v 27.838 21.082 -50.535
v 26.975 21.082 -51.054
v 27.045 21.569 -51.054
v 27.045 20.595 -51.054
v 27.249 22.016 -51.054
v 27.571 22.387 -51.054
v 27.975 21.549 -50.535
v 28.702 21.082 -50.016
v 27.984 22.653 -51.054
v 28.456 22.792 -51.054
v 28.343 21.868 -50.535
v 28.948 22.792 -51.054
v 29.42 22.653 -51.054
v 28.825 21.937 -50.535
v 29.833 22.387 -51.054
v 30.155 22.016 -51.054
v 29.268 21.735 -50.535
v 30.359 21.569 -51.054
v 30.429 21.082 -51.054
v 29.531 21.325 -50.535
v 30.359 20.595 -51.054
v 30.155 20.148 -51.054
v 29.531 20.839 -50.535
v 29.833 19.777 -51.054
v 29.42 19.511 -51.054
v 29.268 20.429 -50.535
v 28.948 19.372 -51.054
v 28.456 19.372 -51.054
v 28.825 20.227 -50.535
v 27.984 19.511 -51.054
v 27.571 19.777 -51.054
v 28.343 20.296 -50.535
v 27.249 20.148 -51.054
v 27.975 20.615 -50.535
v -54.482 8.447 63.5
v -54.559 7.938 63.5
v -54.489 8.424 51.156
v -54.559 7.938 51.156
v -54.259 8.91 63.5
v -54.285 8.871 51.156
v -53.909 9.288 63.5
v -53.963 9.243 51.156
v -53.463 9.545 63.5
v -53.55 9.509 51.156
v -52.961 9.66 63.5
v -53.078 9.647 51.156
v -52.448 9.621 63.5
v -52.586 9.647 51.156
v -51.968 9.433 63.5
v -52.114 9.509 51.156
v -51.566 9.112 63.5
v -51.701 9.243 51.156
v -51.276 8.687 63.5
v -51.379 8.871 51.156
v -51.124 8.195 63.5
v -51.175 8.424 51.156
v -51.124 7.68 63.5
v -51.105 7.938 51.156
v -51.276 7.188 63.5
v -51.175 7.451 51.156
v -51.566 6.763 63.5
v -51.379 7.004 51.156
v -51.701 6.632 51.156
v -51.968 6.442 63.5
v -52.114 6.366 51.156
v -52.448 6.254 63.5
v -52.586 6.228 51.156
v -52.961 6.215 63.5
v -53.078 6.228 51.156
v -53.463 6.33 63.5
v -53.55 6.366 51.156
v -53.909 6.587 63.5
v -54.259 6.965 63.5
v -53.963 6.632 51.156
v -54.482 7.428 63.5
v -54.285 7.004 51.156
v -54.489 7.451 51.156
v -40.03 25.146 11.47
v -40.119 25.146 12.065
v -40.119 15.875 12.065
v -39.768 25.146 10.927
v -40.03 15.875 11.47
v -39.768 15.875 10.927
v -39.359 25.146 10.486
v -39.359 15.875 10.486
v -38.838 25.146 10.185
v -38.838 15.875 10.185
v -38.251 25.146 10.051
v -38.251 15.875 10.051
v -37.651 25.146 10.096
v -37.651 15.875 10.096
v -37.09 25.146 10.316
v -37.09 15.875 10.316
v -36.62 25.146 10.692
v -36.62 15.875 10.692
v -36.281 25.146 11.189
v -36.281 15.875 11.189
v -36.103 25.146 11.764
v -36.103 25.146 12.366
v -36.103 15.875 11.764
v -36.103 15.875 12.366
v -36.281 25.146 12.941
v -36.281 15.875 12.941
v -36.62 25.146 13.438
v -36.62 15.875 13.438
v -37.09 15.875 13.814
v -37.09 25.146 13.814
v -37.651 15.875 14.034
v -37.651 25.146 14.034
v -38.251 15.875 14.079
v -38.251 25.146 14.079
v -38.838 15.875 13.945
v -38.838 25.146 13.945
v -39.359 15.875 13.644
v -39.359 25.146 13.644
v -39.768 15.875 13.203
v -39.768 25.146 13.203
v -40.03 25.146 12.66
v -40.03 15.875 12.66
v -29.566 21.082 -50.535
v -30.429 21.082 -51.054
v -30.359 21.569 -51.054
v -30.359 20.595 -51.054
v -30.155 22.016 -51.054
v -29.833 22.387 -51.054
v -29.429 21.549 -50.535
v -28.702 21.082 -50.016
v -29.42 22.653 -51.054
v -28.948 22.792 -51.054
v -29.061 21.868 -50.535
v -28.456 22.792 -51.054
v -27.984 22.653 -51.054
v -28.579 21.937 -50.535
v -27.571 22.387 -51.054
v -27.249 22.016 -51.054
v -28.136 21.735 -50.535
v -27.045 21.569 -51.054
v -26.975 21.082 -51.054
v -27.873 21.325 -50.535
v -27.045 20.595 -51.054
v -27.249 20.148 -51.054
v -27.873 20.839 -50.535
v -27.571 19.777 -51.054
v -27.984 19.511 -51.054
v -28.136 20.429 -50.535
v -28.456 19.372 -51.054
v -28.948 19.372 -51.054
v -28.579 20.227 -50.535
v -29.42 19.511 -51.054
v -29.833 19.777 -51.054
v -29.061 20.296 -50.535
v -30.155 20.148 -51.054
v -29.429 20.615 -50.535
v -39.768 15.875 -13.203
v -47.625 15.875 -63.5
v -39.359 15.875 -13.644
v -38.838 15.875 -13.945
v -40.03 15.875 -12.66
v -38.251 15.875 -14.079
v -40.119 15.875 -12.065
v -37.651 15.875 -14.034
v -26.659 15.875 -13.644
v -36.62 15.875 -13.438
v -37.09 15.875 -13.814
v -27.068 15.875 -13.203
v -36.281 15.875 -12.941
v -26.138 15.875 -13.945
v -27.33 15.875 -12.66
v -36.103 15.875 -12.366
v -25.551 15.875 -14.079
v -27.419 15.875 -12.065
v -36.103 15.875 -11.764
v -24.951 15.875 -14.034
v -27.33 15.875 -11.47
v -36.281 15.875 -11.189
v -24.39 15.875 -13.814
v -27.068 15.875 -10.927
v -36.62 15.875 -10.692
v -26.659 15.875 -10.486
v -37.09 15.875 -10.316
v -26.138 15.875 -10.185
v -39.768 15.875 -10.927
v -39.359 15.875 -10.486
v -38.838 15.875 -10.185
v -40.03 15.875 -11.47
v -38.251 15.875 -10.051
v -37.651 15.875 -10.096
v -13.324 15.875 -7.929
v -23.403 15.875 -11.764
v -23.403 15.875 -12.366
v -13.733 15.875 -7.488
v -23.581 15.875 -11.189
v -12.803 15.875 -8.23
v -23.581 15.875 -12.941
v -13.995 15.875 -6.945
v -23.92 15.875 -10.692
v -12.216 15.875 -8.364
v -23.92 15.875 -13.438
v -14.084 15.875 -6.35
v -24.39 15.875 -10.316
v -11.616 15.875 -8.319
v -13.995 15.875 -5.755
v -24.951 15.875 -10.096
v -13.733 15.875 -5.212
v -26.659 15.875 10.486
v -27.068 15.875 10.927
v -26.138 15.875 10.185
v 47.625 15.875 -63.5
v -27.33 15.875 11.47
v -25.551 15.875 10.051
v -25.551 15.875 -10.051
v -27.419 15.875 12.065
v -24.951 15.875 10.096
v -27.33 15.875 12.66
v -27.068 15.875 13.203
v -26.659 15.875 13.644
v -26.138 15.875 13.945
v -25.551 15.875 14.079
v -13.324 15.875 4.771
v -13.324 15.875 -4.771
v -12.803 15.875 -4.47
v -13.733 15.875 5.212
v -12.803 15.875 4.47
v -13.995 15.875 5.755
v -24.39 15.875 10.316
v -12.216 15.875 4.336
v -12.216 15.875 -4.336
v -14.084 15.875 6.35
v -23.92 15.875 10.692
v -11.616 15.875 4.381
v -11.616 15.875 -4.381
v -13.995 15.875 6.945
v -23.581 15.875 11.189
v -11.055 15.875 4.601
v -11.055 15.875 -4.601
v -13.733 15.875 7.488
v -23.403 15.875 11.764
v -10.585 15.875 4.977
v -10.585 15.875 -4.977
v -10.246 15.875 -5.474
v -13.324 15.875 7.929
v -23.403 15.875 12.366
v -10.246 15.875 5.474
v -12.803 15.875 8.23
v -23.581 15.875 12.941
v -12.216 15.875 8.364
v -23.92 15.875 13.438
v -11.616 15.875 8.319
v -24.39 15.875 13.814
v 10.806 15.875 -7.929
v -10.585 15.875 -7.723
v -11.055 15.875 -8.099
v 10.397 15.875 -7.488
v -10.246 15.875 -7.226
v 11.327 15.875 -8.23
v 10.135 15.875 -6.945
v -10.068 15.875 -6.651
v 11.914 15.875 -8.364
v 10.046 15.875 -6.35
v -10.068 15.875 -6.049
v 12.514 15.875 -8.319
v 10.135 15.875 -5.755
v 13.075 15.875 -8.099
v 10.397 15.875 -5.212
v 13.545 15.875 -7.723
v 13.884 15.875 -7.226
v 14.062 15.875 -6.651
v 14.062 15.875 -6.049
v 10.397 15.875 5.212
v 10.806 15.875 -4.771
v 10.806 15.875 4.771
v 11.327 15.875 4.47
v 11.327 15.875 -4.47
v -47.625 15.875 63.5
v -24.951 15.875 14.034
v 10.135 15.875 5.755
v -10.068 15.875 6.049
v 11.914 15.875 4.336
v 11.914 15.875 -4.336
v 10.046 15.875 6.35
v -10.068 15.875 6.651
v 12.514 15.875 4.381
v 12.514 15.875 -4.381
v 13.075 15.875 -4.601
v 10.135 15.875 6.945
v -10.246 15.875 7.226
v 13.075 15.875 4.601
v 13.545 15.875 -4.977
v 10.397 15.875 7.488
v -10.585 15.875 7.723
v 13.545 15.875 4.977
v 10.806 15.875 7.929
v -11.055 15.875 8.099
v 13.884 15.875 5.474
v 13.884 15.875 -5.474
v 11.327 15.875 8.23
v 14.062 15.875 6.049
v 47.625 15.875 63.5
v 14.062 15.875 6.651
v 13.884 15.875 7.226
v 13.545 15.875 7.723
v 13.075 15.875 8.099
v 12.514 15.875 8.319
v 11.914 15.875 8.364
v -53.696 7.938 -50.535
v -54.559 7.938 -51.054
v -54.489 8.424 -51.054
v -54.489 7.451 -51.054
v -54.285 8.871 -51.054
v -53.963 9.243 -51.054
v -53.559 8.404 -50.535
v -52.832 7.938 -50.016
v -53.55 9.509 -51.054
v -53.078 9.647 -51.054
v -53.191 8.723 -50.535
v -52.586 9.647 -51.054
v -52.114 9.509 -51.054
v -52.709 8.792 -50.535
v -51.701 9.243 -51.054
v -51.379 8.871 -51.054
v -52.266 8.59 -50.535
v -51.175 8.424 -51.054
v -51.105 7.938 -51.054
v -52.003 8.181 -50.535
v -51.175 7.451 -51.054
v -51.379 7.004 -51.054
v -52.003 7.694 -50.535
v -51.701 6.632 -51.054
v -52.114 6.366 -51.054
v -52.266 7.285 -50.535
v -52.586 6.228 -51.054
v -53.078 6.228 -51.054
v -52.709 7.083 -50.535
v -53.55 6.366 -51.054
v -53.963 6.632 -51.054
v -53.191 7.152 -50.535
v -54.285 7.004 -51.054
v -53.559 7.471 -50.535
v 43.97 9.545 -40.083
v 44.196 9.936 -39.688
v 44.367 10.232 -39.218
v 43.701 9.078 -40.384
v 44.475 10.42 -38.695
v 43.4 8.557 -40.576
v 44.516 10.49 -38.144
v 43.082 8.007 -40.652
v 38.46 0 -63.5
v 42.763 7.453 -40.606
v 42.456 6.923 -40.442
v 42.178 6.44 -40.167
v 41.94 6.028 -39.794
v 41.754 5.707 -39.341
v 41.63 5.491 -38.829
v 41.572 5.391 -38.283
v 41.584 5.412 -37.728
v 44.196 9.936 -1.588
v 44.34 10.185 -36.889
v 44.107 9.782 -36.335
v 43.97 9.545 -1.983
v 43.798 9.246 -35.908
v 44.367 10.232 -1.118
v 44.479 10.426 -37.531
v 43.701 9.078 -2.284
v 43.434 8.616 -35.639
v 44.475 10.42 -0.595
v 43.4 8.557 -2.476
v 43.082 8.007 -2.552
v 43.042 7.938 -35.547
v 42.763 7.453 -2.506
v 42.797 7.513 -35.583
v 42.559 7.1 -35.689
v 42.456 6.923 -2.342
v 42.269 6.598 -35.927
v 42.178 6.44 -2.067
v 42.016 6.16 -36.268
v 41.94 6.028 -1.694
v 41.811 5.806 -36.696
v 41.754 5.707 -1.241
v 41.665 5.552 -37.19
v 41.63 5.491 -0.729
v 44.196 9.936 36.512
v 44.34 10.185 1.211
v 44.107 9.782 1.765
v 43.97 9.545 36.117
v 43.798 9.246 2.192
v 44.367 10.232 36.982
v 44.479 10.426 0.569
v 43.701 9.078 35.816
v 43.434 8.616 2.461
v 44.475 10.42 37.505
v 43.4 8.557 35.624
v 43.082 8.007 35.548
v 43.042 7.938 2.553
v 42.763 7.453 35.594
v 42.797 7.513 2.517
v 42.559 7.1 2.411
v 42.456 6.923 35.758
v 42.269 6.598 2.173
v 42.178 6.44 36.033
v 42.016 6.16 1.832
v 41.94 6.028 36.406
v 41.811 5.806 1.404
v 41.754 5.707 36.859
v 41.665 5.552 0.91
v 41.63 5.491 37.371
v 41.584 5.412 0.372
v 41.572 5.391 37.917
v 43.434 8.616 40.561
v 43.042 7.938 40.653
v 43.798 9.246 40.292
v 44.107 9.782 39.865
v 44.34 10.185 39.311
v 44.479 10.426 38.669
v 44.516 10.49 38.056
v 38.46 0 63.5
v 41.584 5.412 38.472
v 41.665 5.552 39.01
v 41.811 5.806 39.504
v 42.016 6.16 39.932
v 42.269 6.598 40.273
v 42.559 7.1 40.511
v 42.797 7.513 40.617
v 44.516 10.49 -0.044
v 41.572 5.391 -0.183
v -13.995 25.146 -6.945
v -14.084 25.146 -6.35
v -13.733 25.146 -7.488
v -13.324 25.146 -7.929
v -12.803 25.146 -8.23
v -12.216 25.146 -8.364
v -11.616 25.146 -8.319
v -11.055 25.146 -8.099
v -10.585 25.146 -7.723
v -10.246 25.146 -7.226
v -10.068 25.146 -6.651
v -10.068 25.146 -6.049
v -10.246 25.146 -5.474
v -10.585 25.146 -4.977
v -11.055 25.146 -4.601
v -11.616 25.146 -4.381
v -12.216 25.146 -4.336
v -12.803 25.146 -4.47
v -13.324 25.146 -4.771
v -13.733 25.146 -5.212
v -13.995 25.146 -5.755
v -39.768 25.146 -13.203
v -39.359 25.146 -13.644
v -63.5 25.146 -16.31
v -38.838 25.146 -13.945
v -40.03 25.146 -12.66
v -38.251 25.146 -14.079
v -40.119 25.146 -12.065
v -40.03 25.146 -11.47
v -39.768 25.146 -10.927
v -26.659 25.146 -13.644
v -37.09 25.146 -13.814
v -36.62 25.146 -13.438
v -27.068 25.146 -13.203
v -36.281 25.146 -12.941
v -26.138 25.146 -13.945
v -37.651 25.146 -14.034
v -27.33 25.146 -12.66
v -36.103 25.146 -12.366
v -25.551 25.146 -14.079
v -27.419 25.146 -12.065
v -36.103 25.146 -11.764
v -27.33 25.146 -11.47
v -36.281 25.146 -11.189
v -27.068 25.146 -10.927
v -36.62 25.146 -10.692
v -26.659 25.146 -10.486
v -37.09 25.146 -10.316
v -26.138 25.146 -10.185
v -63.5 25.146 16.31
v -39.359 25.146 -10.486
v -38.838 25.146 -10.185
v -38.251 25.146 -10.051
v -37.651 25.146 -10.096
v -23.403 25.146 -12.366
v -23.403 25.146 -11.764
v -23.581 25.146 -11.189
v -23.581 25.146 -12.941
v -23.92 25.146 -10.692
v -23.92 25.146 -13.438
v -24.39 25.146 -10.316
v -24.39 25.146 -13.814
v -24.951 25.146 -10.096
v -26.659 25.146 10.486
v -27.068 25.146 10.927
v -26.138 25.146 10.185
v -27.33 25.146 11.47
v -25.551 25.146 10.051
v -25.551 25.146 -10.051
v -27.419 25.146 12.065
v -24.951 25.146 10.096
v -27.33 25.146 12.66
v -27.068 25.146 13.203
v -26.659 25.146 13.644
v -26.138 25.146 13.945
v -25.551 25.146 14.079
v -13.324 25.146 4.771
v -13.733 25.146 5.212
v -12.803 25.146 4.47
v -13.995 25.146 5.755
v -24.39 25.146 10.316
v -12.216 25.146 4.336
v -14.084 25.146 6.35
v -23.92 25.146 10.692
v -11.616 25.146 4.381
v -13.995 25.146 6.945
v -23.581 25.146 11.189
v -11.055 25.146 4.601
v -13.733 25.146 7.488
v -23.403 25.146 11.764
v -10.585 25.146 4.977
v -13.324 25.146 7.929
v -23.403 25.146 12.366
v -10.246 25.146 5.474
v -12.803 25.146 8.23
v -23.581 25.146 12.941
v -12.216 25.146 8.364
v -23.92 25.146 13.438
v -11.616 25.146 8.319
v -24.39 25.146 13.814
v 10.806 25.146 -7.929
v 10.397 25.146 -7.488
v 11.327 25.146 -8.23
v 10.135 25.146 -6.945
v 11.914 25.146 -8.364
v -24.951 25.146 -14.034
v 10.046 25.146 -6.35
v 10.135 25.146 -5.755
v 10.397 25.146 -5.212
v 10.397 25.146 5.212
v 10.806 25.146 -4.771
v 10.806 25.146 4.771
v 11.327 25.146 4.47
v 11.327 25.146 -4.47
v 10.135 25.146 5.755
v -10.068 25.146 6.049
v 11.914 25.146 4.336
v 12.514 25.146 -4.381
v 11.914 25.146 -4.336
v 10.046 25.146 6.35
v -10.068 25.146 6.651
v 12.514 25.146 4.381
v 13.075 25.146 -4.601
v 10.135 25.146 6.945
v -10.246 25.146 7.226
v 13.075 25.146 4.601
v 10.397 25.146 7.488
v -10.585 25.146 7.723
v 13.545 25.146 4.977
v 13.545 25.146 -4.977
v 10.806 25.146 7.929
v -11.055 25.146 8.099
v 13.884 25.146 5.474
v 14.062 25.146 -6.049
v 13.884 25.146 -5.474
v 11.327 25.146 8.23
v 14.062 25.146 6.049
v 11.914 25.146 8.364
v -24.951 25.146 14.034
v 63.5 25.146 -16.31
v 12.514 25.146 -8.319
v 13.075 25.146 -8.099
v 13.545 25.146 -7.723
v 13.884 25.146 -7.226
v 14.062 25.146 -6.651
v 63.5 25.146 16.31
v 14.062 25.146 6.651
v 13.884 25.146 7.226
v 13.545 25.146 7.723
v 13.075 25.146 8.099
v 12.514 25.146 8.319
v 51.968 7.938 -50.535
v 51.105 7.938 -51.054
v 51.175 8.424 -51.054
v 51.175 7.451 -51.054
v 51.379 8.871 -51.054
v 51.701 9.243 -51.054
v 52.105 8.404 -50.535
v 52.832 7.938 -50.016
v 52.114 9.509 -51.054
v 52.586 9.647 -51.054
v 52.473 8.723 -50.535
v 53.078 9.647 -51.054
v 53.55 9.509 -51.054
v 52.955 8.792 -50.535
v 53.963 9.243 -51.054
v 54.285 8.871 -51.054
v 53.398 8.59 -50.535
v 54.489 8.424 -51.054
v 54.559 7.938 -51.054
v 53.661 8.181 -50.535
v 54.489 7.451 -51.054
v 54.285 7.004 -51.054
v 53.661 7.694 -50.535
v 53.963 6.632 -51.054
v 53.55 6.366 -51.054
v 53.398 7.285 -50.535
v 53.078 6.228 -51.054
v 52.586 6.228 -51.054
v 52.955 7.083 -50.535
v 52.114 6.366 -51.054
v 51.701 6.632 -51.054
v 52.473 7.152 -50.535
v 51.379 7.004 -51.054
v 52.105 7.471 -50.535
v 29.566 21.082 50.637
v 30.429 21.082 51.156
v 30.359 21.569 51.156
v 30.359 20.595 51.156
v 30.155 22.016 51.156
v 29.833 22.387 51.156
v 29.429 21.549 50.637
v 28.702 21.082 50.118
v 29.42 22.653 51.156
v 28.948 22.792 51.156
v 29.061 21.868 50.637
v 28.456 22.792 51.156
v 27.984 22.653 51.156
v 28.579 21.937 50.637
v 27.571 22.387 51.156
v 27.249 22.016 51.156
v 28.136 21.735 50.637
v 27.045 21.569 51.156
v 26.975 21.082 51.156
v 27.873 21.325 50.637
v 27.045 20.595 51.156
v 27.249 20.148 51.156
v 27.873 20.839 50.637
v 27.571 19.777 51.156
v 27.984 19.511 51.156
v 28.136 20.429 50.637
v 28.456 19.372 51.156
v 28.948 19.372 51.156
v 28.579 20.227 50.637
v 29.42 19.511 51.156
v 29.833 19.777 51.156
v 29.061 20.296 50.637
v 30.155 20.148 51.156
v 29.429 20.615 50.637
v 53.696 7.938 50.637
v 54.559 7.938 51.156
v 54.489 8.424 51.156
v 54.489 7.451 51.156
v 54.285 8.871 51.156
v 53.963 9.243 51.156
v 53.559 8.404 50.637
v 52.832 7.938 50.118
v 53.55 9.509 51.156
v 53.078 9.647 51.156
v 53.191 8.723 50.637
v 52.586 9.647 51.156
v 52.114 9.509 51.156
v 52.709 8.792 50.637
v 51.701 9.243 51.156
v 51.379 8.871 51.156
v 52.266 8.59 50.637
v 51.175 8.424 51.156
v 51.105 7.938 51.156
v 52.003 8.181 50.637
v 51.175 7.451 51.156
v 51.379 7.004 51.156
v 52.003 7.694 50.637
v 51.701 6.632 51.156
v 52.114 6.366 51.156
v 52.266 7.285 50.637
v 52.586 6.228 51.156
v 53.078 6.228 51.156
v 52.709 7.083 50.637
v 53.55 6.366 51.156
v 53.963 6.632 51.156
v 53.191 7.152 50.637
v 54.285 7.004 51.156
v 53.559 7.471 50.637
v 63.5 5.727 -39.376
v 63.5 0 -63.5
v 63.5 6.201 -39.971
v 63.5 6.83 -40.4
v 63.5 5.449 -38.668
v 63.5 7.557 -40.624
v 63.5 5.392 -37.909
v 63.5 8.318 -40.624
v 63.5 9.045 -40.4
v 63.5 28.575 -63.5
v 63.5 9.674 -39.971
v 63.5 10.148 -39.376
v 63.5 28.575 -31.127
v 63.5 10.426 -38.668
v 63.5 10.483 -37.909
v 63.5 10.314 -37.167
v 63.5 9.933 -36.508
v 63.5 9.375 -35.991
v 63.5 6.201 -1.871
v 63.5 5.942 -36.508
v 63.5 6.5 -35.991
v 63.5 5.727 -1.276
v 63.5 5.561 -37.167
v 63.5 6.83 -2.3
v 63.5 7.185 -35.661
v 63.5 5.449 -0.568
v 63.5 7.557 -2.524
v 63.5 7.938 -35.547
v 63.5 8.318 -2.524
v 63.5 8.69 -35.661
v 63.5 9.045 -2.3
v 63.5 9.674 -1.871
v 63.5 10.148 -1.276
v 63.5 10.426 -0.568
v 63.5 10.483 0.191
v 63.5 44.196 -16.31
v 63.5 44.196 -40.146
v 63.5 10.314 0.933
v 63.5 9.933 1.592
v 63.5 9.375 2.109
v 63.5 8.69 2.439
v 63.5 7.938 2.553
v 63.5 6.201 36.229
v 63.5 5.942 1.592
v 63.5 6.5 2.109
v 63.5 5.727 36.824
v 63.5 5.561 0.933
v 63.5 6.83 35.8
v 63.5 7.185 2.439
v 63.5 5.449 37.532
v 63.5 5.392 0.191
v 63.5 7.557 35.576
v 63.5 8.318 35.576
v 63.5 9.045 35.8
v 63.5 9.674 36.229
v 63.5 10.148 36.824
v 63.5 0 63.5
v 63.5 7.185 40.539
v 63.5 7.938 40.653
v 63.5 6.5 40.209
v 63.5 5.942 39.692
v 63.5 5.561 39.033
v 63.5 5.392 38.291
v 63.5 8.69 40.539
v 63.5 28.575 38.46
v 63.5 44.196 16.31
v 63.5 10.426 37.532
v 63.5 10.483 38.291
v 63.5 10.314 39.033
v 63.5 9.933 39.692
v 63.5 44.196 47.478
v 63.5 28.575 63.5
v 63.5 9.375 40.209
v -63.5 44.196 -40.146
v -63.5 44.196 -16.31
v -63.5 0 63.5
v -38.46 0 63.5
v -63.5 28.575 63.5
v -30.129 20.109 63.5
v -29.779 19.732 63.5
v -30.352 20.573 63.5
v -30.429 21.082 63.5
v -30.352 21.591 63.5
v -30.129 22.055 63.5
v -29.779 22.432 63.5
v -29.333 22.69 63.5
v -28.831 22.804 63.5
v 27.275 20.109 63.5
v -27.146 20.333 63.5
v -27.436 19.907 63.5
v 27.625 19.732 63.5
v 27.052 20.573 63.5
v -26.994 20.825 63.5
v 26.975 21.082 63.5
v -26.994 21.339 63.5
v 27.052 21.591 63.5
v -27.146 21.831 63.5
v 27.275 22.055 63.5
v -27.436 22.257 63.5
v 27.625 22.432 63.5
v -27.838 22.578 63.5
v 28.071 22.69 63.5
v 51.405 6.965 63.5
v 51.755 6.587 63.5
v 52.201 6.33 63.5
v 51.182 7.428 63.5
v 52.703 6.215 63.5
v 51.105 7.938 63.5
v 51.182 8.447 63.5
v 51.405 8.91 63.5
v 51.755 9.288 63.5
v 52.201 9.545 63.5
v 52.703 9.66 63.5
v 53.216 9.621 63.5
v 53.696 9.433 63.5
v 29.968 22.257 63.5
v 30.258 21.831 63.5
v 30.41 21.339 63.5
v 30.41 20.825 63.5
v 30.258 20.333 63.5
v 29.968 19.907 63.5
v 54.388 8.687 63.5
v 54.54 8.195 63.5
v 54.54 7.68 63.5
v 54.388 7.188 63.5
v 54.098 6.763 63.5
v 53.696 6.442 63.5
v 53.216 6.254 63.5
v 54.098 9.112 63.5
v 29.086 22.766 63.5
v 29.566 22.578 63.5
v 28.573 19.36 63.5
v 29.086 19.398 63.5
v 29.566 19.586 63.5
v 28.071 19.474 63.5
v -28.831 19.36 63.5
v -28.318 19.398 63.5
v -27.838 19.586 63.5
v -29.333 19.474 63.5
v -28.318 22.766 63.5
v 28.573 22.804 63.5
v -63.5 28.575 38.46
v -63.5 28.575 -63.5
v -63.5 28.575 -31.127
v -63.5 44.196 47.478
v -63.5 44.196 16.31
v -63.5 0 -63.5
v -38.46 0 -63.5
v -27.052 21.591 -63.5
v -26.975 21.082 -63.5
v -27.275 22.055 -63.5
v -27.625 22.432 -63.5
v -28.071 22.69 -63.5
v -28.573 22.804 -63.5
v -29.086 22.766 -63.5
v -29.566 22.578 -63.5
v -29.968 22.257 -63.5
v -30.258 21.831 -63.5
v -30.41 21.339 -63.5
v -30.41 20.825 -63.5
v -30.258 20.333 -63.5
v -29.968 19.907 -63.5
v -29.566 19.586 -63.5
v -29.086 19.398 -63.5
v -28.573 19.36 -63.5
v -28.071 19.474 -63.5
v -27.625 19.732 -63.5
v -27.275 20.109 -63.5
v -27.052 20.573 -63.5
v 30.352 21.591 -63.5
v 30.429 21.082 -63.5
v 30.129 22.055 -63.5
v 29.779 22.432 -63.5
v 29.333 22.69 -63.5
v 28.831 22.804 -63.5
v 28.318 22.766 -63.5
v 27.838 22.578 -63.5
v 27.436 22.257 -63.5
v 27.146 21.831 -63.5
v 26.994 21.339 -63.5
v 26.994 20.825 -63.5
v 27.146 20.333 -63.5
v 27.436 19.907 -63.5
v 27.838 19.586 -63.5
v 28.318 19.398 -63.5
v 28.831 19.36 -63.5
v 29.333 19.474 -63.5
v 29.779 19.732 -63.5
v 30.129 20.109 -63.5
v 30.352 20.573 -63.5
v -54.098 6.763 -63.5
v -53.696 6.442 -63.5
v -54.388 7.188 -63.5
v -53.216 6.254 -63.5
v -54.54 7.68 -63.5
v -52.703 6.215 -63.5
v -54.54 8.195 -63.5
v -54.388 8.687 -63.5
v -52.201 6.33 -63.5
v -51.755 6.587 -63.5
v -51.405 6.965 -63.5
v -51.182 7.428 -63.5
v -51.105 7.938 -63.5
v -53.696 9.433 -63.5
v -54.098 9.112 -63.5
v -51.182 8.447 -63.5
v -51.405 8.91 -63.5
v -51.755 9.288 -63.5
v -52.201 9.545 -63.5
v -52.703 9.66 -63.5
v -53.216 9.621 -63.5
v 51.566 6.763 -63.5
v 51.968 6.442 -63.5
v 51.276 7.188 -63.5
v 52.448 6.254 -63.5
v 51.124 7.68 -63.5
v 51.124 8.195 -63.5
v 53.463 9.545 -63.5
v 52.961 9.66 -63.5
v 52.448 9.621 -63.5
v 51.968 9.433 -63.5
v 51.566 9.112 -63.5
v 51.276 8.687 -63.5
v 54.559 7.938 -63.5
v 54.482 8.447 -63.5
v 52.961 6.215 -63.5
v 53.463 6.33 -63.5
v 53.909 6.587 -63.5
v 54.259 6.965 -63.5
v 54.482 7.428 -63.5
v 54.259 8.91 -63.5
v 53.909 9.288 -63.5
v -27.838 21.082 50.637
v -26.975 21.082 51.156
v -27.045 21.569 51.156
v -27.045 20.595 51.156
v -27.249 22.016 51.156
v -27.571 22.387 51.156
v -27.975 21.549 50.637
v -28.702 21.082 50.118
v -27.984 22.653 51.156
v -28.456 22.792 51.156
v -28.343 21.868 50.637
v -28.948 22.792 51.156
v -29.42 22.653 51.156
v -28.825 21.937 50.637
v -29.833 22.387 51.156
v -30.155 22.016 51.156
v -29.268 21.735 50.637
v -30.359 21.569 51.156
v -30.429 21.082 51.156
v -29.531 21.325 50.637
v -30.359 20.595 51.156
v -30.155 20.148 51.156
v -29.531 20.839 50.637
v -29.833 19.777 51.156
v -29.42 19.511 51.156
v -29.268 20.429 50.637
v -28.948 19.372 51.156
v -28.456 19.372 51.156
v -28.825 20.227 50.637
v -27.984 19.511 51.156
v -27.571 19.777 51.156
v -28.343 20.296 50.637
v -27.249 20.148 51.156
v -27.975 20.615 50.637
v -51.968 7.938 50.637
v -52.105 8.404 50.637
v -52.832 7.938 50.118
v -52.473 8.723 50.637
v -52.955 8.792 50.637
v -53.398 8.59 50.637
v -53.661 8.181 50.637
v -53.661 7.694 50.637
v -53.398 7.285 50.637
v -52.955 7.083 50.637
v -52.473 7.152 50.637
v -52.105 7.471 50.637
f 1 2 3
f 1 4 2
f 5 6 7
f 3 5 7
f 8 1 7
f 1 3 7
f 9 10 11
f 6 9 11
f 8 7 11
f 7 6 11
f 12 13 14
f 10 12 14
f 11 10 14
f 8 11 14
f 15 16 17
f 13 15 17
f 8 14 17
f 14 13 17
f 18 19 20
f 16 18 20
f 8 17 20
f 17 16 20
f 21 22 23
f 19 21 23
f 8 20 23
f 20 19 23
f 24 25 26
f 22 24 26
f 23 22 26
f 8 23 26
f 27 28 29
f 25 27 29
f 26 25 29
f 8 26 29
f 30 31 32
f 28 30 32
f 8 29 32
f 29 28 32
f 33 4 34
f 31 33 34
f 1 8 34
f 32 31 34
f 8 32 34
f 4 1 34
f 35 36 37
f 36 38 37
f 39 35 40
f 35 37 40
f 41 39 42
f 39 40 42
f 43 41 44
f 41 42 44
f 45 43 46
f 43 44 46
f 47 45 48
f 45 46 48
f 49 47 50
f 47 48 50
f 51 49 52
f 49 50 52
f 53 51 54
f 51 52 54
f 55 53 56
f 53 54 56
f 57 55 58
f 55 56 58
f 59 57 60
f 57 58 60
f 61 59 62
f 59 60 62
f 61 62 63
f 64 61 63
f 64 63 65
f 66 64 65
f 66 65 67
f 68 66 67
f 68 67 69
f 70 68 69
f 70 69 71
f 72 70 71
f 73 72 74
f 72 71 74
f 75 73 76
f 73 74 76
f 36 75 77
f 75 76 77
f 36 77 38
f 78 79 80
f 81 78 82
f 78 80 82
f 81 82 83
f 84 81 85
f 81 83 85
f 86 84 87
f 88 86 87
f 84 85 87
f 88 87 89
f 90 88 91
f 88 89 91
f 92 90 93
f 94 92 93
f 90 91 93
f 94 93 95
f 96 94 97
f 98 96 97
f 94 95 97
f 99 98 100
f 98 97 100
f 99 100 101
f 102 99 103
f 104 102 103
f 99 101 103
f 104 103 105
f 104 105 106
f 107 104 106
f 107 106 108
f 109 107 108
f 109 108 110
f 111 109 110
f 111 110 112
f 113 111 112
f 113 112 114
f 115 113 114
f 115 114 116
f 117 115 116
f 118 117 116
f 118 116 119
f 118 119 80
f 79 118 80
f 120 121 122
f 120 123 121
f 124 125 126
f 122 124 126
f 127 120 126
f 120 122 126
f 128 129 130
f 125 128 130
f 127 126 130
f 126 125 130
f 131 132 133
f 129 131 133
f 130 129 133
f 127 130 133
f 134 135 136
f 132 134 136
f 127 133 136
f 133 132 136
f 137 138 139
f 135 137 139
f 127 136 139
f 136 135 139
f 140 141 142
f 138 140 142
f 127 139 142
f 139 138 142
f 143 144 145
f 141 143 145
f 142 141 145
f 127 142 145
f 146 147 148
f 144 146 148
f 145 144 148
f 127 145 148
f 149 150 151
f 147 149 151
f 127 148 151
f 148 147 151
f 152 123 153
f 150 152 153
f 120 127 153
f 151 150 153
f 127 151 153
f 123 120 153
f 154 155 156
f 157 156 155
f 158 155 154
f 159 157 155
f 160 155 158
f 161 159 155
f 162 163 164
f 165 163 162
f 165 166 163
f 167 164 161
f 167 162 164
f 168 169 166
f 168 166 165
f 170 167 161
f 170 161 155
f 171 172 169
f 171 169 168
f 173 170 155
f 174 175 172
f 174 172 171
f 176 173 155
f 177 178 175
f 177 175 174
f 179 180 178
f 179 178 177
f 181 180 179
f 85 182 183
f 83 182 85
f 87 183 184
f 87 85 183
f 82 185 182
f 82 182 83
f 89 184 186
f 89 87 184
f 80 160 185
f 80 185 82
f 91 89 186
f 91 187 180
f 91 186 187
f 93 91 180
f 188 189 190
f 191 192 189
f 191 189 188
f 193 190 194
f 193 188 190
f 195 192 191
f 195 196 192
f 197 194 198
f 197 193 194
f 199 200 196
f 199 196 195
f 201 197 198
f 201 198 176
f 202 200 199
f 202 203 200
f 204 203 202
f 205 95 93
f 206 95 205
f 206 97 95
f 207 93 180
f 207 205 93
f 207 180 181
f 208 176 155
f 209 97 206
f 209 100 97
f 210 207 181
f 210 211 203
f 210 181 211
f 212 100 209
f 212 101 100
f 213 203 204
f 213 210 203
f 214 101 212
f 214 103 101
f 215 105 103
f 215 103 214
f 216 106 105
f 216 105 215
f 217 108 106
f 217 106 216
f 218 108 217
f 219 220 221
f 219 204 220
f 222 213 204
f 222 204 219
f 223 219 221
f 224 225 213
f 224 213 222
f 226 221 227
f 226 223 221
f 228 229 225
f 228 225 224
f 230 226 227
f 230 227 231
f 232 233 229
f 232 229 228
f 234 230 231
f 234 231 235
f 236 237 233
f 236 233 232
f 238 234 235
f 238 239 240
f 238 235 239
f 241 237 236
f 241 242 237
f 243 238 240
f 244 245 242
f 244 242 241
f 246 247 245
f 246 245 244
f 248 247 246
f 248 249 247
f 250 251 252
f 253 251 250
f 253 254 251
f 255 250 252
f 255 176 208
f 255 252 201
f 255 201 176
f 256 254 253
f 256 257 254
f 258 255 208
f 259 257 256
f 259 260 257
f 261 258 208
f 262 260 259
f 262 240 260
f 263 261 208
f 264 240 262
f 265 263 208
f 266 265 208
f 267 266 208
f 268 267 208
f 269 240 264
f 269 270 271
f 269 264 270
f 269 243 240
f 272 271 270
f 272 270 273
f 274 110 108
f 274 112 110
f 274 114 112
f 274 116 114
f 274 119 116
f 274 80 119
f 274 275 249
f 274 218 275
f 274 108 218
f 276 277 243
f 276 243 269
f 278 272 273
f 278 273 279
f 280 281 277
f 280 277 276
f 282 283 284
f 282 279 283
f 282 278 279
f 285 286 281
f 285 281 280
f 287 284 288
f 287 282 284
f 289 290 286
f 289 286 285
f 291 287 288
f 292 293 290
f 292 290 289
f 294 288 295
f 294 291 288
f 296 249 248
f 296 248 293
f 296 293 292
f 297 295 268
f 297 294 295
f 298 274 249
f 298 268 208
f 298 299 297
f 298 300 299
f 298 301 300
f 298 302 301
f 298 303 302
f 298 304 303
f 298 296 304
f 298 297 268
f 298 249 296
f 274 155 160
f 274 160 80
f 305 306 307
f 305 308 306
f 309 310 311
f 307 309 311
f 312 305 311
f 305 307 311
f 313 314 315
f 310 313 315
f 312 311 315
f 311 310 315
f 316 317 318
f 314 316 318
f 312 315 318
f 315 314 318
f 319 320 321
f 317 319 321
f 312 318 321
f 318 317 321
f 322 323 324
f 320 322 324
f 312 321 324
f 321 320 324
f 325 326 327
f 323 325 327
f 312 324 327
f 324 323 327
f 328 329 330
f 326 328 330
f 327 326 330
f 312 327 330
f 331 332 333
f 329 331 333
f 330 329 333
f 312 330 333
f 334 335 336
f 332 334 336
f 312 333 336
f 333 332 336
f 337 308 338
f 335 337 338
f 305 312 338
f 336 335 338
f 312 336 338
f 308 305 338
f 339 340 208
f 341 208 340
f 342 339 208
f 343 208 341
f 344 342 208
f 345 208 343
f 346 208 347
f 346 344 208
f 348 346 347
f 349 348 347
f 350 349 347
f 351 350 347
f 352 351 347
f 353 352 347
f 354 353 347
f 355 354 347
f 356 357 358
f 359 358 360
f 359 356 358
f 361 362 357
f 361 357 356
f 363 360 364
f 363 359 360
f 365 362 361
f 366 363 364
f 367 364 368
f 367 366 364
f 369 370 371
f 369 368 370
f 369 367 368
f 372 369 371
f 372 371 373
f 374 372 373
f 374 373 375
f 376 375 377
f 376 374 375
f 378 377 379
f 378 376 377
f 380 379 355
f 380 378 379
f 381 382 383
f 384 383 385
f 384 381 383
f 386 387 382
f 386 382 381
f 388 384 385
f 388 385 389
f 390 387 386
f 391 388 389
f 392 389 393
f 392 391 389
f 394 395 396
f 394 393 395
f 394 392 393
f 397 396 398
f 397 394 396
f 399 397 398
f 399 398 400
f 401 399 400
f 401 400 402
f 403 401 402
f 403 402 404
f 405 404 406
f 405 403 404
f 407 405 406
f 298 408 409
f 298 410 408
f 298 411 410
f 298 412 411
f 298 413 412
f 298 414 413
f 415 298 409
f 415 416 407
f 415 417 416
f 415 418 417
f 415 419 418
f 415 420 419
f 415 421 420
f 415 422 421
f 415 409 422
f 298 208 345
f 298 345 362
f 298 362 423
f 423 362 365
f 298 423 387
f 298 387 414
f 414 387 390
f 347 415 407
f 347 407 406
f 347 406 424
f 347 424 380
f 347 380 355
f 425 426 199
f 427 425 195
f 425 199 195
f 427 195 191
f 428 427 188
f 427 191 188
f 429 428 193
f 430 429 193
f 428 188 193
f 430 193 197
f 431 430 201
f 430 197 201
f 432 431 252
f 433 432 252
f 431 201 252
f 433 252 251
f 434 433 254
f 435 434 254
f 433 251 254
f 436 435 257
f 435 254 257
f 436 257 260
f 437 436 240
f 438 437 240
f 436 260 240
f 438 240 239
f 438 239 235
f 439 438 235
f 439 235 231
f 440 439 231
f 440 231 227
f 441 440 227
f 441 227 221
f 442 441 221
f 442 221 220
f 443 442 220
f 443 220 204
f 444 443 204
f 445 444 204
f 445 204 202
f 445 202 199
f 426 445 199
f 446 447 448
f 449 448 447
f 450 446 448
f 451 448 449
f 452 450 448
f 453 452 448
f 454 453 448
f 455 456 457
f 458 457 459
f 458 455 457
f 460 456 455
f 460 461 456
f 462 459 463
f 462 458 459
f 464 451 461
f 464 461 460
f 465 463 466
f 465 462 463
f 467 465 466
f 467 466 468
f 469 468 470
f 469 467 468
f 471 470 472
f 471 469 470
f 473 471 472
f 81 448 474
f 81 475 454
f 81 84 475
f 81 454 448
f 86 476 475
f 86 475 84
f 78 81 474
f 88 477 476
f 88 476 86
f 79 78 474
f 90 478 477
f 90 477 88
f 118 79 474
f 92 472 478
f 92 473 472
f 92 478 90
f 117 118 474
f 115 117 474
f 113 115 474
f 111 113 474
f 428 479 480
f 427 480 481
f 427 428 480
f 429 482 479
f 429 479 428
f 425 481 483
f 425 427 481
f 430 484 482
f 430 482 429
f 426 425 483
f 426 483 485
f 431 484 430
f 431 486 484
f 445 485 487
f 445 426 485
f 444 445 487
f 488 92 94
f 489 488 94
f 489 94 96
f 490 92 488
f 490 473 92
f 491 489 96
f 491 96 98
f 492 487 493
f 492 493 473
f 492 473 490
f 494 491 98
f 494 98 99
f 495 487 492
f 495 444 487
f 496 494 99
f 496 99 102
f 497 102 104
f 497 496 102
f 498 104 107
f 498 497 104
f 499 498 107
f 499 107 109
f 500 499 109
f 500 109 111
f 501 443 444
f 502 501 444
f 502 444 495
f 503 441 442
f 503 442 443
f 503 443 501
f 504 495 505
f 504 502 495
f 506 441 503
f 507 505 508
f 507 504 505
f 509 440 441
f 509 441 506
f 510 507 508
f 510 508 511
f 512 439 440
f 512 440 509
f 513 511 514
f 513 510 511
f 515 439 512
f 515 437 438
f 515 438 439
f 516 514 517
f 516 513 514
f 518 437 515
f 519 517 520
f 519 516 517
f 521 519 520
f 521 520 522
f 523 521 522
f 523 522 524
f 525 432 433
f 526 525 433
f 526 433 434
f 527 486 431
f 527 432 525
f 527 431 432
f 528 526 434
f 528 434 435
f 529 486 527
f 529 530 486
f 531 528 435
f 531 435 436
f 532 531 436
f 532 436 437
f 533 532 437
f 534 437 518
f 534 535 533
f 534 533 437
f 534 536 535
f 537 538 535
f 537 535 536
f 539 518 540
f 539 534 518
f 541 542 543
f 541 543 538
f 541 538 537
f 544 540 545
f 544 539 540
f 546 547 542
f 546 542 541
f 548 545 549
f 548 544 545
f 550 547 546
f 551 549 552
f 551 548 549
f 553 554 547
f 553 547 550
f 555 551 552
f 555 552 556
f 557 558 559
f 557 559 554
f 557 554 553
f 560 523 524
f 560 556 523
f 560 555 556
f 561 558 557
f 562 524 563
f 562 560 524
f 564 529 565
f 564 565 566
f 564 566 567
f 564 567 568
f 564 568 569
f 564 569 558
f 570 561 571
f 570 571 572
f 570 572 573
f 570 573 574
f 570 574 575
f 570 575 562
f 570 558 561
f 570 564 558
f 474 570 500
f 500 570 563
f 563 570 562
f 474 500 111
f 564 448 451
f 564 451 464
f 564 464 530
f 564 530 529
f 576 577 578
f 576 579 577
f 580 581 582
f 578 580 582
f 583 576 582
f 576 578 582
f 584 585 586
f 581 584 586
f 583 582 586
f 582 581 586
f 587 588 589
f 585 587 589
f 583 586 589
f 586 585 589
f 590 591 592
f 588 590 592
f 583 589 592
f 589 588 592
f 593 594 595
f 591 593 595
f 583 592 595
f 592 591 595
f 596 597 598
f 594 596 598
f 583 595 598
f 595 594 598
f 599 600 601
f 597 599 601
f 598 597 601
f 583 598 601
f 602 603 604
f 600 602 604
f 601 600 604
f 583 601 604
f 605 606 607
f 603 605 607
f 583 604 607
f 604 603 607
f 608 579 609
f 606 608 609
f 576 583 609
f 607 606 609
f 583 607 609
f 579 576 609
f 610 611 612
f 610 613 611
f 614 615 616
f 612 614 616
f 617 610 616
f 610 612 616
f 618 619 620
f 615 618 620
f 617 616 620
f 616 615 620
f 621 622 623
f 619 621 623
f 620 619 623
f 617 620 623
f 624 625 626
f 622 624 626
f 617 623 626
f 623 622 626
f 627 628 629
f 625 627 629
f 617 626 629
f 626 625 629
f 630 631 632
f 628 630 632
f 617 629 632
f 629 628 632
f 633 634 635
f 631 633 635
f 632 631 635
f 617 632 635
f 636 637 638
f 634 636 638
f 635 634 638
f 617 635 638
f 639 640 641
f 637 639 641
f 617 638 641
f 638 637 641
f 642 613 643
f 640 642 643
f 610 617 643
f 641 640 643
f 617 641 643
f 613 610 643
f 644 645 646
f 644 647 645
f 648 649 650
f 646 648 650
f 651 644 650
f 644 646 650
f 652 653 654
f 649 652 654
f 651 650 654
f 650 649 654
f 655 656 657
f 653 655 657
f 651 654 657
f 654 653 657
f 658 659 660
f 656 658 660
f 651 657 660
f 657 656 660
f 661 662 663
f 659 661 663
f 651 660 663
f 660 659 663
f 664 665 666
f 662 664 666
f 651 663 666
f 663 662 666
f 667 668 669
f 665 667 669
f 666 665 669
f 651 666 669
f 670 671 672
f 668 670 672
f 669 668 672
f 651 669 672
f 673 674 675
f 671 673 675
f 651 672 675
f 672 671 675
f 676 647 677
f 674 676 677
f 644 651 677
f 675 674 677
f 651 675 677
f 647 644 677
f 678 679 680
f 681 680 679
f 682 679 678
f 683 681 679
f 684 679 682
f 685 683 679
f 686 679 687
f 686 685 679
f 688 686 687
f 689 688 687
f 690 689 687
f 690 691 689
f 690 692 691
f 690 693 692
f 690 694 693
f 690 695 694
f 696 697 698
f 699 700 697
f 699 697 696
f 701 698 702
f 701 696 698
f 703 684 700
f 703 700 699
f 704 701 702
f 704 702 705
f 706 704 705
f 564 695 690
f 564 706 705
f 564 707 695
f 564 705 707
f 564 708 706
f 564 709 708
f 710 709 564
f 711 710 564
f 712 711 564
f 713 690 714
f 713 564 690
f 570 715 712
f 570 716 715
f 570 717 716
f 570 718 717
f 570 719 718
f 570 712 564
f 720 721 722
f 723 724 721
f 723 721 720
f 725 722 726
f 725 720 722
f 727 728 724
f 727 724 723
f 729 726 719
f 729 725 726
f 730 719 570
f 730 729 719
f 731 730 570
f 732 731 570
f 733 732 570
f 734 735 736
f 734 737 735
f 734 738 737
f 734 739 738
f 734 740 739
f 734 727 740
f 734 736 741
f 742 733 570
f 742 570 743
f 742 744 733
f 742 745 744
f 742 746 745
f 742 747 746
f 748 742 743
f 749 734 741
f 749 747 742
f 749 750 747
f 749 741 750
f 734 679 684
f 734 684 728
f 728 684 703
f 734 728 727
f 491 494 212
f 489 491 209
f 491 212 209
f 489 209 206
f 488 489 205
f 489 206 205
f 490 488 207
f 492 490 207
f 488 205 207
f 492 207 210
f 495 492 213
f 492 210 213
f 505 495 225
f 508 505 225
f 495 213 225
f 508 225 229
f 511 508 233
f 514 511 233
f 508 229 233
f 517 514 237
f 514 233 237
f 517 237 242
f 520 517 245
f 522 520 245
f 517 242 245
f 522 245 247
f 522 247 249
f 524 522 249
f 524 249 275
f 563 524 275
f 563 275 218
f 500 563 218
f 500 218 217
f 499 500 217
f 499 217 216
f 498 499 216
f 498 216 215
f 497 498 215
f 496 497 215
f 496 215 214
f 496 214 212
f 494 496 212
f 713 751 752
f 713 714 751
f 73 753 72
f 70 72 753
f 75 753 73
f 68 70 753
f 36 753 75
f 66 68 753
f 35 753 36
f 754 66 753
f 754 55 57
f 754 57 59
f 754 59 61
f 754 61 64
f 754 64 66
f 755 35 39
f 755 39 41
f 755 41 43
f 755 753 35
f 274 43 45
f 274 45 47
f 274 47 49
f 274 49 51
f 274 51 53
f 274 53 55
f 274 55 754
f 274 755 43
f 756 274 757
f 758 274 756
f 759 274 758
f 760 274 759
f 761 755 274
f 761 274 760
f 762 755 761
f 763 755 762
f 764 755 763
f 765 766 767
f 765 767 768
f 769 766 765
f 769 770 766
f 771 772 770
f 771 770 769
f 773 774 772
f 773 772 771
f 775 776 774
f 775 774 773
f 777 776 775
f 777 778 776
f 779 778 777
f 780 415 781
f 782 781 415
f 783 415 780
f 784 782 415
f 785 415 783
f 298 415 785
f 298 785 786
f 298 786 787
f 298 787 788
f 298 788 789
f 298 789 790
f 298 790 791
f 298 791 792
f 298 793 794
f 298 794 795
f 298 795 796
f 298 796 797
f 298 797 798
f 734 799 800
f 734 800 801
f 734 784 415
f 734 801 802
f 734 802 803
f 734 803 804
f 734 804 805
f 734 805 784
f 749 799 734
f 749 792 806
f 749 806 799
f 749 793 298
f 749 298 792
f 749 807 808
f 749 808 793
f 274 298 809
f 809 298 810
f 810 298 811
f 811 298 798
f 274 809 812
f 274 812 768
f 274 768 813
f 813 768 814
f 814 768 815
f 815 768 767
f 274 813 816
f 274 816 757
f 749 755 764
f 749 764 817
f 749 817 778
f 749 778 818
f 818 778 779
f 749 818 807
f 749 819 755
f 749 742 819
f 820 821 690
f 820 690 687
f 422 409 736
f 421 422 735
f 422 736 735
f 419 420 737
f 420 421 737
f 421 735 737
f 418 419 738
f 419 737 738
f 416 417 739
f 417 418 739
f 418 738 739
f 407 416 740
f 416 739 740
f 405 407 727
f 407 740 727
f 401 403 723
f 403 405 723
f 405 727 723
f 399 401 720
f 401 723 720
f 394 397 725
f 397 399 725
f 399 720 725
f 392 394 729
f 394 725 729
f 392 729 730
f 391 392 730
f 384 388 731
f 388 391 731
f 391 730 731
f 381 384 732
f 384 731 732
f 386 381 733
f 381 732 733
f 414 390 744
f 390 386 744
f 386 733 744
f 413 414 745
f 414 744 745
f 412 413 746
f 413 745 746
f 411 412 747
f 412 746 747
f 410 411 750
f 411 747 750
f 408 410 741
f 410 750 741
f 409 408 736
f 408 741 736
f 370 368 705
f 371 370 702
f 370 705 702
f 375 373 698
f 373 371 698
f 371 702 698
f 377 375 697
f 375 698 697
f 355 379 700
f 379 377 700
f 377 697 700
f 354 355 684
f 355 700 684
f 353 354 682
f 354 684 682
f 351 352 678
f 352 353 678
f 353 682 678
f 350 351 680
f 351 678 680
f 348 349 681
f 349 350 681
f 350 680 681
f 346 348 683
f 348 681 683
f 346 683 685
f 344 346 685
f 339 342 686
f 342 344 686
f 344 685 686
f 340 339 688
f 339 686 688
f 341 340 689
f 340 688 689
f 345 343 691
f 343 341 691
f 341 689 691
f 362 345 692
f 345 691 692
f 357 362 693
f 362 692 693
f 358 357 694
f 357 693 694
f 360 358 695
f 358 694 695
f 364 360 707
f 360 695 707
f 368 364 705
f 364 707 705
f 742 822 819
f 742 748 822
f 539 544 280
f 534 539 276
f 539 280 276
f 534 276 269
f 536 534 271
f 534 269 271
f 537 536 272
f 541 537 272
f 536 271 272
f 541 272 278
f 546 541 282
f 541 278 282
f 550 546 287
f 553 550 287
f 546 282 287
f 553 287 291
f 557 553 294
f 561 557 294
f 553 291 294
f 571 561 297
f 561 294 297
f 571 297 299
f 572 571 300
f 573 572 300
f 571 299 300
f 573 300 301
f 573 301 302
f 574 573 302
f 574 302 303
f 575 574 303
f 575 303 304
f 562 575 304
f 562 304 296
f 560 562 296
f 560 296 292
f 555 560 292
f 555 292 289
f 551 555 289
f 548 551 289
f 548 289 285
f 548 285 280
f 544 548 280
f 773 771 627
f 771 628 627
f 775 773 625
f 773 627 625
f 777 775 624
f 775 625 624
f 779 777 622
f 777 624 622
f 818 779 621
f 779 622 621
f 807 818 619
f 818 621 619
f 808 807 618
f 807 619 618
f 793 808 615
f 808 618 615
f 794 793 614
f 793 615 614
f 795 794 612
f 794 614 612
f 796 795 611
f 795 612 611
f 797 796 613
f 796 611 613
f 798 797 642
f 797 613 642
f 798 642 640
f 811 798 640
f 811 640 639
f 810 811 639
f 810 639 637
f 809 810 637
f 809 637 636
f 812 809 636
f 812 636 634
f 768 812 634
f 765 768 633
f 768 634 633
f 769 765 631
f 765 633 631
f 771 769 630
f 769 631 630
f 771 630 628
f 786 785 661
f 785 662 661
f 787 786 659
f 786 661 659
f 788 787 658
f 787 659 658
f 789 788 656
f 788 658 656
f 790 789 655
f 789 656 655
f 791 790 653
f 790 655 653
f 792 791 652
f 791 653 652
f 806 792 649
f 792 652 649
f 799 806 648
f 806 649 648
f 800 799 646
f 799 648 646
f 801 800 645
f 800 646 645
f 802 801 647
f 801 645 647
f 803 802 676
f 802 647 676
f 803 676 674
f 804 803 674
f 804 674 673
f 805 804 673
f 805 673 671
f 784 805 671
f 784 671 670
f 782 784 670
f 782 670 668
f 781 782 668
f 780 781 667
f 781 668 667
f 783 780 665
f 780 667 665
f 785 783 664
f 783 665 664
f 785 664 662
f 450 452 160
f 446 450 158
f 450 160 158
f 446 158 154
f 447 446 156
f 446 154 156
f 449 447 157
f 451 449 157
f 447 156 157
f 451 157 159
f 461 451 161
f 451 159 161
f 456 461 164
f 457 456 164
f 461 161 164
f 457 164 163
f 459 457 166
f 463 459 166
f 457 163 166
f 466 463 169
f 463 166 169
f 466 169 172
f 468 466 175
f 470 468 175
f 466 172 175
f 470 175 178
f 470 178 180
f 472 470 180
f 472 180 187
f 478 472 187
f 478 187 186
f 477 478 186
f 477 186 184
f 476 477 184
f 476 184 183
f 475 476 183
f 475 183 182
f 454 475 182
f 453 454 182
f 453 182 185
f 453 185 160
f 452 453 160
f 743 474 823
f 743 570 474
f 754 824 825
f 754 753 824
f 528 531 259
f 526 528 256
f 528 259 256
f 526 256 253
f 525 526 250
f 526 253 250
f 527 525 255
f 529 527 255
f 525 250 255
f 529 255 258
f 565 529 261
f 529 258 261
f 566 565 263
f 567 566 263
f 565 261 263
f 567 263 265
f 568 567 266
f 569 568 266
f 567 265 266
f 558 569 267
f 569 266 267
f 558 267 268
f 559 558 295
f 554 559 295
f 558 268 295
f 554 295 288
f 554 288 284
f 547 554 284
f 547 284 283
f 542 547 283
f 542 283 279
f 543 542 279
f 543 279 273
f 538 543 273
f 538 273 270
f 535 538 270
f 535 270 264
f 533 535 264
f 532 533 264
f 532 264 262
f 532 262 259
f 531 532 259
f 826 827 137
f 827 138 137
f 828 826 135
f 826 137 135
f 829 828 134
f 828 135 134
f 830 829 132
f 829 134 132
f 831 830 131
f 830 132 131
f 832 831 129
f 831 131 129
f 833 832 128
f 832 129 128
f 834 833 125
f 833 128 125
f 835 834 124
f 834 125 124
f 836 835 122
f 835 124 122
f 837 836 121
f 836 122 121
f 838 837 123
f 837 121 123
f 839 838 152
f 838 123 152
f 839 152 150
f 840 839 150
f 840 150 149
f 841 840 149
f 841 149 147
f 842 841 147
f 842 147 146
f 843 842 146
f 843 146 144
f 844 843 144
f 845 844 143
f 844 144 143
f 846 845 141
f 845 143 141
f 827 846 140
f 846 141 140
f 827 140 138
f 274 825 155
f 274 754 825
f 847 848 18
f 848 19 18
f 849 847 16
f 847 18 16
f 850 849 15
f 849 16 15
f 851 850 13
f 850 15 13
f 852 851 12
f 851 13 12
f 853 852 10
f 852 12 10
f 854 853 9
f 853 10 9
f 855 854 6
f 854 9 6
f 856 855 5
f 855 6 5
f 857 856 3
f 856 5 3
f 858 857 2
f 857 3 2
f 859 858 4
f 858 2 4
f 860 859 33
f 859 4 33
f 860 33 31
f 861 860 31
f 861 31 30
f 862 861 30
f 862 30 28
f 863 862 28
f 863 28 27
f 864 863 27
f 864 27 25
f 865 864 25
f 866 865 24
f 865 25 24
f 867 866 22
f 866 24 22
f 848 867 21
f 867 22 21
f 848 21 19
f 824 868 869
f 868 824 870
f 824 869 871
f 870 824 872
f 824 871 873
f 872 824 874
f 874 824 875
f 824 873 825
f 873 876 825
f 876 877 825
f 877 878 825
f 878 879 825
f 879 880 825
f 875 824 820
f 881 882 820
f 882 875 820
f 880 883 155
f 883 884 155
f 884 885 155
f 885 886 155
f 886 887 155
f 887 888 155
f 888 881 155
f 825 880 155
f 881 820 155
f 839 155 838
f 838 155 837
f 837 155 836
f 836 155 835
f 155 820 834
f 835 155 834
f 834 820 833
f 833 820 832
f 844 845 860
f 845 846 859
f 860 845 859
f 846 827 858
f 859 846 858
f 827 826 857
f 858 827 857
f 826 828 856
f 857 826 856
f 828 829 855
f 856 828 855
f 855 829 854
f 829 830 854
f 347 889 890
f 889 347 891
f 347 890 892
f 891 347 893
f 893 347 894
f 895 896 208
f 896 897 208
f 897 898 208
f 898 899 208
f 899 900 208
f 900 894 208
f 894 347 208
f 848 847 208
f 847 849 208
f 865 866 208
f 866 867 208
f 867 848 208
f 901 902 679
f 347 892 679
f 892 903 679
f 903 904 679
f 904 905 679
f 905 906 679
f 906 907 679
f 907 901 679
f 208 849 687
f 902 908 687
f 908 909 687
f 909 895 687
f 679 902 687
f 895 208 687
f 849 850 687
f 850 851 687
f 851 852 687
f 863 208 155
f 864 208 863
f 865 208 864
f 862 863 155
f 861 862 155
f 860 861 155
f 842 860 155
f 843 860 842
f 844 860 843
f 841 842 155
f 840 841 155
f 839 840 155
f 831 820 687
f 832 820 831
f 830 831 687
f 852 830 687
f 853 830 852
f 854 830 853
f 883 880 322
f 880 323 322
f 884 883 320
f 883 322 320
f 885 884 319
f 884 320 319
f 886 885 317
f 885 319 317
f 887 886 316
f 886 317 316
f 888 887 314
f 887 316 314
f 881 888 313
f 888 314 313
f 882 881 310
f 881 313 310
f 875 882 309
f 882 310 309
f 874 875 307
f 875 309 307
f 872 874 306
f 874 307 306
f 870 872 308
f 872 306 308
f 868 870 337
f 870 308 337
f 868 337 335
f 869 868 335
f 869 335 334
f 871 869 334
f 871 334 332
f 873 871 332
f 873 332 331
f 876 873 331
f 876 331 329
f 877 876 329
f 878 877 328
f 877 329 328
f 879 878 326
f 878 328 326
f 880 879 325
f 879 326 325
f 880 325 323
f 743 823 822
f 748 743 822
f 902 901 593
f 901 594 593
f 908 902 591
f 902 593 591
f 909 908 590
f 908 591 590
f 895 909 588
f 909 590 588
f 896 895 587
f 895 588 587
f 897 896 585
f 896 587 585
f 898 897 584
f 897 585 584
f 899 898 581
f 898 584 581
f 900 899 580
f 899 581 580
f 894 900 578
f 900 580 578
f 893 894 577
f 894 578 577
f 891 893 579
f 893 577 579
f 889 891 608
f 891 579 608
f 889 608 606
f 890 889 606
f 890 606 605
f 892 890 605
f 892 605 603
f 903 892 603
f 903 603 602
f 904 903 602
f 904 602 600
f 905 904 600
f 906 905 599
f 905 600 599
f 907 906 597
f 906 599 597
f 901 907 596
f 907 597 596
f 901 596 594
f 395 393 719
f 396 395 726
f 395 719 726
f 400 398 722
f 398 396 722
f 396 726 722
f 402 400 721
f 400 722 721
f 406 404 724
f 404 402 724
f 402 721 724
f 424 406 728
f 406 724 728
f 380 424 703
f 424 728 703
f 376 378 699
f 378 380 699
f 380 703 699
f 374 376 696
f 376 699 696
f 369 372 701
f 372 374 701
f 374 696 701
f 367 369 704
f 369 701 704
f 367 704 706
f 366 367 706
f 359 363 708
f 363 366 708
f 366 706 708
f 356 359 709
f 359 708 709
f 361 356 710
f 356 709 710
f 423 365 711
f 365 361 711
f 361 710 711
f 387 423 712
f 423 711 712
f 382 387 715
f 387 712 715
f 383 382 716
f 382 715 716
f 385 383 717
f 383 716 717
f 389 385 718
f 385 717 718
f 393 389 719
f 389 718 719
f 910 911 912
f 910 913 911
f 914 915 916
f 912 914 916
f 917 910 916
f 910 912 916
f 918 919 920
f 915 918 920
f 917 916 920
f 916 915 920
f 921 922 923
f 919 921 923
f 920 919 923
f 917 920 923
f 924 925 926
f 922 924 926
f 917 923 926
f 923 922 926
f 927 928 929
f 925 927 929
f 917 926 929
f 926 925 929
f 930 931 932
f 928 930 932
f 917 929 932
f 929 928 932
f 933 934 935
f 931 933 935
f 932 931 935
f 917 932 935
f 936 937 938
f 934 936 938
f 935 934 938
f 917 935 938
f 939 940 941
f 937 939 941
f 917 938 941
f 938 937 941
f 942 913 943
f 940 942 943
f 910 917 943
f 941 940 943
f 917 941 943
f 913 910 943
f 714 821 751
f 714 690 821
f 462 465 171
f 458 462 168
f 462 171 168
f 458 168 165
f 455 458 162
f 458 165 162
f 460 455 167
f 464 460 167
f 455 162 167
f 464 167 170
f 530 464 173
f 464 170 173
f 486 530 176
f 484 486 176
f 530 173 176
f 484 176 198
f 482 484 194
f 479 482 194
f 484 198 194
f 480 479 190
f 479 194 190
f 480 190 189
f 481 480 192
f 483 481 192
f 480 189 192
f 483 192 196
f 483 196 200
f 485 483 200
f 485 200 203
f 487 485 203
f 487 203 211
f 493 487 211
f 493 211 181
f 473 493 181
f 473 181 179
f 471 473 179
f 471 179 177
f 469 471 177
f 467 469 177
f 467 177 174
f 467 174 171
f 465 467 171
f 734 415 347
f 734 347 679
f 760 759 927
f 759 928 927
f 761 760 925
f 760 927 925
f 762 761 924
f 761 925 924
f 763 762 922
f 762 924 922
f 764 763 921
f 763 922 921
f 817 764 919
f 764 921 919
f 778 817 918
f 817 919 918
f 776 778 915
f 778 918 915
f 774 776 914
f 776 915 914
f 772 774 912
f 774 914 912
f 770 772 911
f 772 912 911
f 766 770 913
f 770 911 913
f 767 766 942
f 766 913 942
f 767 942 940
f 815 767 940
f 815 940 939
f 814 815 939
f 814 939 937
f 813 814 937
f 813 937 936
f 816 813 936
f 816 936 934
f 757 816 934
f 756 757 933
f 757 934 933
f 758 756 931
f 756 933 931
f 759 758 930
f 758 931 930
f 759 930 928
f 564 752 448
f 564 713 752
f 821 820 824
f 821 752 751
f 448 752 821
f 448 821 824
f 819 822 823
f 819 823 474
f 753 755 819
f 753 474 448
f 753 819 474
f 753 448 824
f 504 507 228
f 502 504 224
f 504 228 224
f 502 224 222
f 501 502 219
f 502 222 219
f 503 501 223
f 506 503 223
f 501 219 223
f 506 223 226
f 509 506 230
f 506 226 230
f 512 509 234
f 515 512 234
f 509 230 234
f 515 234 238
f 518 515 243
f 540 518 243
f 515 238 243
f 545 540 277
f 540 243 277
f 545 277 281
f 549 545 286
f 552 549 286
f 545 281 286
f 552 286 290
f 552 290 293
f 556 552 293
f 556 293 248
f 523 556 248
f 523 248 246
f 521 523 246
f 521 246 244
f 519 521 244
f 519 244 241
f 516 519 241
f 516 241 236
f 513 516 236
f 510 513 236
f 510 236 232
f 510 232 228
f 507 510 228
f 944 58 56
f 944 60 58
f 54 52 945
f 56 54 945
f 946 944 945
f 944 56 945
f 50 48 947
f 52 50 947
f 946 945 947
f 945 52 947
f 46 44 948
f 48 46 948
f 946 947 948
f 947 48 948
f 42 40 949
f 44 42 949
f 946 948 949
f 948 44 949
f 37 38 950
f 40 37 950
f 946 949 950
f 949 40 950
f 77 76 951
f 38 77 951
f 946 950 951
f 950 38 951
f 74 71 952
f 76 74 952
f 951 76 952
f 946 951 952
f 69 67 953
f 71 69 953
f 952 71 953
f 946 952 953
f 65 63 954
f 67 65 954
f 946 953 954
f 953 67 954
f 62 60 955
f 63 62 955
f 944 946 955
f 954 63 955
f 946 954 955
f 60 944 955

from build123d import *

# Parameters (mm, degrees)
X_CARRIAGE_EXTRUDE_DEPTH                 = 63.5
Y_GUIDE_CUT_EXTRUDE_DEPTH                = 63.5
F_8_32_TAPPED_HOLE1_D                    = 3.4544
F_8_32_TAPPED_HOLE1_DEPTH                = 12.3444
F_8_32_TAPPED_HOLE1_TIP                  = 1.037806461
F_8_32_TAPPED_HOLE2_D                    = 3.4544
F_8_32_TAPPED_HOLE2_DEPTH                = 12.446
F_8_32_TAPPED_HOLE2_TIP                  = 1.037806461
SKETCH8_W                                = 2.5527
SKETCH8_H                                = 63.5
GIB_SCREW_1_4_20_TAPPED_HOLE1_AT_2_COUNT = 2
GIB_SCREW_1_4_20_TAPPED_HOLE1_AT_2_PITCH = 38.1
GIB_SCREW_1_4_20_TAPPED_HOLE1_AT_3_COUNT = 2
GIB_SCREW_1_4_20_TAPPED_HOLE1_AT_3_PITCH = 76.2
F_10_32_TAPPED_HOLE1_D                   = 4.0386
F_10_32_TAPPED_HOLE1_DEPTH               = 9.271


with BuildPart() as part:
    # female-dovetail-profile → x-carriage-extrude (new, symmetric)
    with BuildSketch(Plane.XY):
        Polygon((-47.625, 15.875), (-40.292651581, 15.875), (-16.056336319, 15.875), (16.056336319, 15.875), (47.625, 15.875), (38.459564477, 0), (63.5, 0), (63.5, 31.75), (63.5, 44.45), (-63.5, 44.45), (-63.5, 31.75), (-63.5, 0), (-38.459564477, 0), align=None)
    extrude(amount=X_CARRIAGE_EXTRUDE_DEPTH, both=True)

    # male-dovetail-shoulder-profile → y-guide-cut-extrude (cut, symmetric)
    with BuildSketch(Plane(origin=(0, 0, 0), x_dir=(0, 0, -1), z_dir=(1, 0, 0))):
        Polygon((63.5, 28.575), (38.459564477, 28.575), (31.127216058, 28.575), (40.146004613, 44.196), (16.310336319, 44.196), (16.310336319, 25.146), (-16.310336319, 25.146), (-16.310336319, 44.196), (-47.478353032, 44.196), (-38.459564477, 28.575), (-63.5, 28.575), (-63.5, 44.45), (63.5, 44.45), align=None)
    extrude(amount=Y_GUIDE_CUT_EXTRUDE_DEPTH, both=True, mode=Mode.SUBTRACT)

    # #8-32 Tapped Hole1
    with Locations(Plane(origin=(0, -15.875, 63.5), x_dir=(1, 0, 0), z_dir=(0, 0, 1))):
        with Locations((-52.832, 23.8125), (-28.702, 36.957), (28.702, 36.957), (52.832, 23.8125)):
            Hole(F_8_32_TAPPED_HOLE1_D / 2, depth=F_8_32_TAPPED_HOLE1_DEPTH)
            with Locations((0, 0, -(F_8_32_TAPPED_HOLE1_DEPTH + F_8_32_TAPPED_HOLE1_TIP / 2))):  # 118° drill point
                Cone(0, F_8_32_TAPPED_HOLE1_D / 2, F_8_32_TAPPED_HOLE1_TIP, mode=Mode.SUBTRACT)

    # #8-32 Tapped Hole2
    with Locations(Plane(origin=(0, -15.875, -63.5), x_dir=(-1, 0, 0), z_dir=(0, 0, -1))):
        with Locations((-52.832, 23.8125), (-28.702, 36.957), (28.702, 36.957), (52.832, 23.8125)):
            Hole(F_8_32_TAPPED_HOLE2_D / 2, depth=F_8_32_TAPPED_HOLE2_DEPTH)
            with Locations((0, 0, -(F_8_32_TAPPED_HOLE2_DEPTH + F_8_32_TAPPED_HOLE2_TIP / 2))):  # 118° drill point
                Cone(0, F_8_32_TAPPED_HOLE2_D / 2, F_8_32_TAPPED_HOLE2_TIP, mode=Mode.SUBTRACT)

    # Sketch8 → gib screw 1/4-20 Tapped Hole1 (revolve, cut)
    with BuildSketch(Plane(origin=(0, 7.9375, 38.1), x_dir=(0, 0, 1), z_dir=(0, 1, 0))):
        with Locations((1.27635, 31.75)):
            Rectangle(SKETCH8_W, SKETCH8_H)
    gib_screw_1_4_20_tapped_hole1 = revolve(axis=Axis((-6.35, 7.9375, 38.1), (1, 0, 0)), mode=Mode.SUBTRACT)

    # gib screw 1/4-20 Tapped Hole1 at 2: gib screw 1/4-20 Tapped Hole1 ×2
    with Locations(*[(0, 0, -i * GIB_SCREW_1_4_20_TAPPED_HOLE1_AT_2_PITCH) for i in range(1, GIB_SCREW_1_4_20_TAPPED_HOLE1_AT_2_COUNT)]):
        add(gib_screw_1_4_20_tapped_hole1, mode=Mode.SUBTRACT)

    # gib screw 1/4-20 Tapped Hole1 at 3: gib screw 1/4-20 Tapped Hole1 ×2
    with Locations(*[(0, 0, -i * GIB_SCREW_1_4_20_TAPPED_HOLE1_AT_3_PITCH) for i in range(1, GIB_SCREW_1_4_20_TAPPED_HOLE1_AT_3_COUNT)]):
        add(gib_screw_1_4_20_tapped_hole1, mode=Mode.SUBTRACT)

    # #10-32 Tapped Hole1
    with Locations(Plane(origin=(0, 25.146, 0), x_dir=(1, 0, 0), z_dir=(0, 1, 0))):
        with Locations((-38.1, 12.065), (-38.1, -12.065), (-12.065, 6.35), (-25.4, 12.065), (-25.4, -12.065), (12.065, 6.35), (12.065, -6.35), (-12.065, -6.35)):
            Hole(F_10_32_TAPPED_HOLE1_D / 2, depth=F_10_32_TAPPED_HOLE1_DEPTH)


solid = part.part
